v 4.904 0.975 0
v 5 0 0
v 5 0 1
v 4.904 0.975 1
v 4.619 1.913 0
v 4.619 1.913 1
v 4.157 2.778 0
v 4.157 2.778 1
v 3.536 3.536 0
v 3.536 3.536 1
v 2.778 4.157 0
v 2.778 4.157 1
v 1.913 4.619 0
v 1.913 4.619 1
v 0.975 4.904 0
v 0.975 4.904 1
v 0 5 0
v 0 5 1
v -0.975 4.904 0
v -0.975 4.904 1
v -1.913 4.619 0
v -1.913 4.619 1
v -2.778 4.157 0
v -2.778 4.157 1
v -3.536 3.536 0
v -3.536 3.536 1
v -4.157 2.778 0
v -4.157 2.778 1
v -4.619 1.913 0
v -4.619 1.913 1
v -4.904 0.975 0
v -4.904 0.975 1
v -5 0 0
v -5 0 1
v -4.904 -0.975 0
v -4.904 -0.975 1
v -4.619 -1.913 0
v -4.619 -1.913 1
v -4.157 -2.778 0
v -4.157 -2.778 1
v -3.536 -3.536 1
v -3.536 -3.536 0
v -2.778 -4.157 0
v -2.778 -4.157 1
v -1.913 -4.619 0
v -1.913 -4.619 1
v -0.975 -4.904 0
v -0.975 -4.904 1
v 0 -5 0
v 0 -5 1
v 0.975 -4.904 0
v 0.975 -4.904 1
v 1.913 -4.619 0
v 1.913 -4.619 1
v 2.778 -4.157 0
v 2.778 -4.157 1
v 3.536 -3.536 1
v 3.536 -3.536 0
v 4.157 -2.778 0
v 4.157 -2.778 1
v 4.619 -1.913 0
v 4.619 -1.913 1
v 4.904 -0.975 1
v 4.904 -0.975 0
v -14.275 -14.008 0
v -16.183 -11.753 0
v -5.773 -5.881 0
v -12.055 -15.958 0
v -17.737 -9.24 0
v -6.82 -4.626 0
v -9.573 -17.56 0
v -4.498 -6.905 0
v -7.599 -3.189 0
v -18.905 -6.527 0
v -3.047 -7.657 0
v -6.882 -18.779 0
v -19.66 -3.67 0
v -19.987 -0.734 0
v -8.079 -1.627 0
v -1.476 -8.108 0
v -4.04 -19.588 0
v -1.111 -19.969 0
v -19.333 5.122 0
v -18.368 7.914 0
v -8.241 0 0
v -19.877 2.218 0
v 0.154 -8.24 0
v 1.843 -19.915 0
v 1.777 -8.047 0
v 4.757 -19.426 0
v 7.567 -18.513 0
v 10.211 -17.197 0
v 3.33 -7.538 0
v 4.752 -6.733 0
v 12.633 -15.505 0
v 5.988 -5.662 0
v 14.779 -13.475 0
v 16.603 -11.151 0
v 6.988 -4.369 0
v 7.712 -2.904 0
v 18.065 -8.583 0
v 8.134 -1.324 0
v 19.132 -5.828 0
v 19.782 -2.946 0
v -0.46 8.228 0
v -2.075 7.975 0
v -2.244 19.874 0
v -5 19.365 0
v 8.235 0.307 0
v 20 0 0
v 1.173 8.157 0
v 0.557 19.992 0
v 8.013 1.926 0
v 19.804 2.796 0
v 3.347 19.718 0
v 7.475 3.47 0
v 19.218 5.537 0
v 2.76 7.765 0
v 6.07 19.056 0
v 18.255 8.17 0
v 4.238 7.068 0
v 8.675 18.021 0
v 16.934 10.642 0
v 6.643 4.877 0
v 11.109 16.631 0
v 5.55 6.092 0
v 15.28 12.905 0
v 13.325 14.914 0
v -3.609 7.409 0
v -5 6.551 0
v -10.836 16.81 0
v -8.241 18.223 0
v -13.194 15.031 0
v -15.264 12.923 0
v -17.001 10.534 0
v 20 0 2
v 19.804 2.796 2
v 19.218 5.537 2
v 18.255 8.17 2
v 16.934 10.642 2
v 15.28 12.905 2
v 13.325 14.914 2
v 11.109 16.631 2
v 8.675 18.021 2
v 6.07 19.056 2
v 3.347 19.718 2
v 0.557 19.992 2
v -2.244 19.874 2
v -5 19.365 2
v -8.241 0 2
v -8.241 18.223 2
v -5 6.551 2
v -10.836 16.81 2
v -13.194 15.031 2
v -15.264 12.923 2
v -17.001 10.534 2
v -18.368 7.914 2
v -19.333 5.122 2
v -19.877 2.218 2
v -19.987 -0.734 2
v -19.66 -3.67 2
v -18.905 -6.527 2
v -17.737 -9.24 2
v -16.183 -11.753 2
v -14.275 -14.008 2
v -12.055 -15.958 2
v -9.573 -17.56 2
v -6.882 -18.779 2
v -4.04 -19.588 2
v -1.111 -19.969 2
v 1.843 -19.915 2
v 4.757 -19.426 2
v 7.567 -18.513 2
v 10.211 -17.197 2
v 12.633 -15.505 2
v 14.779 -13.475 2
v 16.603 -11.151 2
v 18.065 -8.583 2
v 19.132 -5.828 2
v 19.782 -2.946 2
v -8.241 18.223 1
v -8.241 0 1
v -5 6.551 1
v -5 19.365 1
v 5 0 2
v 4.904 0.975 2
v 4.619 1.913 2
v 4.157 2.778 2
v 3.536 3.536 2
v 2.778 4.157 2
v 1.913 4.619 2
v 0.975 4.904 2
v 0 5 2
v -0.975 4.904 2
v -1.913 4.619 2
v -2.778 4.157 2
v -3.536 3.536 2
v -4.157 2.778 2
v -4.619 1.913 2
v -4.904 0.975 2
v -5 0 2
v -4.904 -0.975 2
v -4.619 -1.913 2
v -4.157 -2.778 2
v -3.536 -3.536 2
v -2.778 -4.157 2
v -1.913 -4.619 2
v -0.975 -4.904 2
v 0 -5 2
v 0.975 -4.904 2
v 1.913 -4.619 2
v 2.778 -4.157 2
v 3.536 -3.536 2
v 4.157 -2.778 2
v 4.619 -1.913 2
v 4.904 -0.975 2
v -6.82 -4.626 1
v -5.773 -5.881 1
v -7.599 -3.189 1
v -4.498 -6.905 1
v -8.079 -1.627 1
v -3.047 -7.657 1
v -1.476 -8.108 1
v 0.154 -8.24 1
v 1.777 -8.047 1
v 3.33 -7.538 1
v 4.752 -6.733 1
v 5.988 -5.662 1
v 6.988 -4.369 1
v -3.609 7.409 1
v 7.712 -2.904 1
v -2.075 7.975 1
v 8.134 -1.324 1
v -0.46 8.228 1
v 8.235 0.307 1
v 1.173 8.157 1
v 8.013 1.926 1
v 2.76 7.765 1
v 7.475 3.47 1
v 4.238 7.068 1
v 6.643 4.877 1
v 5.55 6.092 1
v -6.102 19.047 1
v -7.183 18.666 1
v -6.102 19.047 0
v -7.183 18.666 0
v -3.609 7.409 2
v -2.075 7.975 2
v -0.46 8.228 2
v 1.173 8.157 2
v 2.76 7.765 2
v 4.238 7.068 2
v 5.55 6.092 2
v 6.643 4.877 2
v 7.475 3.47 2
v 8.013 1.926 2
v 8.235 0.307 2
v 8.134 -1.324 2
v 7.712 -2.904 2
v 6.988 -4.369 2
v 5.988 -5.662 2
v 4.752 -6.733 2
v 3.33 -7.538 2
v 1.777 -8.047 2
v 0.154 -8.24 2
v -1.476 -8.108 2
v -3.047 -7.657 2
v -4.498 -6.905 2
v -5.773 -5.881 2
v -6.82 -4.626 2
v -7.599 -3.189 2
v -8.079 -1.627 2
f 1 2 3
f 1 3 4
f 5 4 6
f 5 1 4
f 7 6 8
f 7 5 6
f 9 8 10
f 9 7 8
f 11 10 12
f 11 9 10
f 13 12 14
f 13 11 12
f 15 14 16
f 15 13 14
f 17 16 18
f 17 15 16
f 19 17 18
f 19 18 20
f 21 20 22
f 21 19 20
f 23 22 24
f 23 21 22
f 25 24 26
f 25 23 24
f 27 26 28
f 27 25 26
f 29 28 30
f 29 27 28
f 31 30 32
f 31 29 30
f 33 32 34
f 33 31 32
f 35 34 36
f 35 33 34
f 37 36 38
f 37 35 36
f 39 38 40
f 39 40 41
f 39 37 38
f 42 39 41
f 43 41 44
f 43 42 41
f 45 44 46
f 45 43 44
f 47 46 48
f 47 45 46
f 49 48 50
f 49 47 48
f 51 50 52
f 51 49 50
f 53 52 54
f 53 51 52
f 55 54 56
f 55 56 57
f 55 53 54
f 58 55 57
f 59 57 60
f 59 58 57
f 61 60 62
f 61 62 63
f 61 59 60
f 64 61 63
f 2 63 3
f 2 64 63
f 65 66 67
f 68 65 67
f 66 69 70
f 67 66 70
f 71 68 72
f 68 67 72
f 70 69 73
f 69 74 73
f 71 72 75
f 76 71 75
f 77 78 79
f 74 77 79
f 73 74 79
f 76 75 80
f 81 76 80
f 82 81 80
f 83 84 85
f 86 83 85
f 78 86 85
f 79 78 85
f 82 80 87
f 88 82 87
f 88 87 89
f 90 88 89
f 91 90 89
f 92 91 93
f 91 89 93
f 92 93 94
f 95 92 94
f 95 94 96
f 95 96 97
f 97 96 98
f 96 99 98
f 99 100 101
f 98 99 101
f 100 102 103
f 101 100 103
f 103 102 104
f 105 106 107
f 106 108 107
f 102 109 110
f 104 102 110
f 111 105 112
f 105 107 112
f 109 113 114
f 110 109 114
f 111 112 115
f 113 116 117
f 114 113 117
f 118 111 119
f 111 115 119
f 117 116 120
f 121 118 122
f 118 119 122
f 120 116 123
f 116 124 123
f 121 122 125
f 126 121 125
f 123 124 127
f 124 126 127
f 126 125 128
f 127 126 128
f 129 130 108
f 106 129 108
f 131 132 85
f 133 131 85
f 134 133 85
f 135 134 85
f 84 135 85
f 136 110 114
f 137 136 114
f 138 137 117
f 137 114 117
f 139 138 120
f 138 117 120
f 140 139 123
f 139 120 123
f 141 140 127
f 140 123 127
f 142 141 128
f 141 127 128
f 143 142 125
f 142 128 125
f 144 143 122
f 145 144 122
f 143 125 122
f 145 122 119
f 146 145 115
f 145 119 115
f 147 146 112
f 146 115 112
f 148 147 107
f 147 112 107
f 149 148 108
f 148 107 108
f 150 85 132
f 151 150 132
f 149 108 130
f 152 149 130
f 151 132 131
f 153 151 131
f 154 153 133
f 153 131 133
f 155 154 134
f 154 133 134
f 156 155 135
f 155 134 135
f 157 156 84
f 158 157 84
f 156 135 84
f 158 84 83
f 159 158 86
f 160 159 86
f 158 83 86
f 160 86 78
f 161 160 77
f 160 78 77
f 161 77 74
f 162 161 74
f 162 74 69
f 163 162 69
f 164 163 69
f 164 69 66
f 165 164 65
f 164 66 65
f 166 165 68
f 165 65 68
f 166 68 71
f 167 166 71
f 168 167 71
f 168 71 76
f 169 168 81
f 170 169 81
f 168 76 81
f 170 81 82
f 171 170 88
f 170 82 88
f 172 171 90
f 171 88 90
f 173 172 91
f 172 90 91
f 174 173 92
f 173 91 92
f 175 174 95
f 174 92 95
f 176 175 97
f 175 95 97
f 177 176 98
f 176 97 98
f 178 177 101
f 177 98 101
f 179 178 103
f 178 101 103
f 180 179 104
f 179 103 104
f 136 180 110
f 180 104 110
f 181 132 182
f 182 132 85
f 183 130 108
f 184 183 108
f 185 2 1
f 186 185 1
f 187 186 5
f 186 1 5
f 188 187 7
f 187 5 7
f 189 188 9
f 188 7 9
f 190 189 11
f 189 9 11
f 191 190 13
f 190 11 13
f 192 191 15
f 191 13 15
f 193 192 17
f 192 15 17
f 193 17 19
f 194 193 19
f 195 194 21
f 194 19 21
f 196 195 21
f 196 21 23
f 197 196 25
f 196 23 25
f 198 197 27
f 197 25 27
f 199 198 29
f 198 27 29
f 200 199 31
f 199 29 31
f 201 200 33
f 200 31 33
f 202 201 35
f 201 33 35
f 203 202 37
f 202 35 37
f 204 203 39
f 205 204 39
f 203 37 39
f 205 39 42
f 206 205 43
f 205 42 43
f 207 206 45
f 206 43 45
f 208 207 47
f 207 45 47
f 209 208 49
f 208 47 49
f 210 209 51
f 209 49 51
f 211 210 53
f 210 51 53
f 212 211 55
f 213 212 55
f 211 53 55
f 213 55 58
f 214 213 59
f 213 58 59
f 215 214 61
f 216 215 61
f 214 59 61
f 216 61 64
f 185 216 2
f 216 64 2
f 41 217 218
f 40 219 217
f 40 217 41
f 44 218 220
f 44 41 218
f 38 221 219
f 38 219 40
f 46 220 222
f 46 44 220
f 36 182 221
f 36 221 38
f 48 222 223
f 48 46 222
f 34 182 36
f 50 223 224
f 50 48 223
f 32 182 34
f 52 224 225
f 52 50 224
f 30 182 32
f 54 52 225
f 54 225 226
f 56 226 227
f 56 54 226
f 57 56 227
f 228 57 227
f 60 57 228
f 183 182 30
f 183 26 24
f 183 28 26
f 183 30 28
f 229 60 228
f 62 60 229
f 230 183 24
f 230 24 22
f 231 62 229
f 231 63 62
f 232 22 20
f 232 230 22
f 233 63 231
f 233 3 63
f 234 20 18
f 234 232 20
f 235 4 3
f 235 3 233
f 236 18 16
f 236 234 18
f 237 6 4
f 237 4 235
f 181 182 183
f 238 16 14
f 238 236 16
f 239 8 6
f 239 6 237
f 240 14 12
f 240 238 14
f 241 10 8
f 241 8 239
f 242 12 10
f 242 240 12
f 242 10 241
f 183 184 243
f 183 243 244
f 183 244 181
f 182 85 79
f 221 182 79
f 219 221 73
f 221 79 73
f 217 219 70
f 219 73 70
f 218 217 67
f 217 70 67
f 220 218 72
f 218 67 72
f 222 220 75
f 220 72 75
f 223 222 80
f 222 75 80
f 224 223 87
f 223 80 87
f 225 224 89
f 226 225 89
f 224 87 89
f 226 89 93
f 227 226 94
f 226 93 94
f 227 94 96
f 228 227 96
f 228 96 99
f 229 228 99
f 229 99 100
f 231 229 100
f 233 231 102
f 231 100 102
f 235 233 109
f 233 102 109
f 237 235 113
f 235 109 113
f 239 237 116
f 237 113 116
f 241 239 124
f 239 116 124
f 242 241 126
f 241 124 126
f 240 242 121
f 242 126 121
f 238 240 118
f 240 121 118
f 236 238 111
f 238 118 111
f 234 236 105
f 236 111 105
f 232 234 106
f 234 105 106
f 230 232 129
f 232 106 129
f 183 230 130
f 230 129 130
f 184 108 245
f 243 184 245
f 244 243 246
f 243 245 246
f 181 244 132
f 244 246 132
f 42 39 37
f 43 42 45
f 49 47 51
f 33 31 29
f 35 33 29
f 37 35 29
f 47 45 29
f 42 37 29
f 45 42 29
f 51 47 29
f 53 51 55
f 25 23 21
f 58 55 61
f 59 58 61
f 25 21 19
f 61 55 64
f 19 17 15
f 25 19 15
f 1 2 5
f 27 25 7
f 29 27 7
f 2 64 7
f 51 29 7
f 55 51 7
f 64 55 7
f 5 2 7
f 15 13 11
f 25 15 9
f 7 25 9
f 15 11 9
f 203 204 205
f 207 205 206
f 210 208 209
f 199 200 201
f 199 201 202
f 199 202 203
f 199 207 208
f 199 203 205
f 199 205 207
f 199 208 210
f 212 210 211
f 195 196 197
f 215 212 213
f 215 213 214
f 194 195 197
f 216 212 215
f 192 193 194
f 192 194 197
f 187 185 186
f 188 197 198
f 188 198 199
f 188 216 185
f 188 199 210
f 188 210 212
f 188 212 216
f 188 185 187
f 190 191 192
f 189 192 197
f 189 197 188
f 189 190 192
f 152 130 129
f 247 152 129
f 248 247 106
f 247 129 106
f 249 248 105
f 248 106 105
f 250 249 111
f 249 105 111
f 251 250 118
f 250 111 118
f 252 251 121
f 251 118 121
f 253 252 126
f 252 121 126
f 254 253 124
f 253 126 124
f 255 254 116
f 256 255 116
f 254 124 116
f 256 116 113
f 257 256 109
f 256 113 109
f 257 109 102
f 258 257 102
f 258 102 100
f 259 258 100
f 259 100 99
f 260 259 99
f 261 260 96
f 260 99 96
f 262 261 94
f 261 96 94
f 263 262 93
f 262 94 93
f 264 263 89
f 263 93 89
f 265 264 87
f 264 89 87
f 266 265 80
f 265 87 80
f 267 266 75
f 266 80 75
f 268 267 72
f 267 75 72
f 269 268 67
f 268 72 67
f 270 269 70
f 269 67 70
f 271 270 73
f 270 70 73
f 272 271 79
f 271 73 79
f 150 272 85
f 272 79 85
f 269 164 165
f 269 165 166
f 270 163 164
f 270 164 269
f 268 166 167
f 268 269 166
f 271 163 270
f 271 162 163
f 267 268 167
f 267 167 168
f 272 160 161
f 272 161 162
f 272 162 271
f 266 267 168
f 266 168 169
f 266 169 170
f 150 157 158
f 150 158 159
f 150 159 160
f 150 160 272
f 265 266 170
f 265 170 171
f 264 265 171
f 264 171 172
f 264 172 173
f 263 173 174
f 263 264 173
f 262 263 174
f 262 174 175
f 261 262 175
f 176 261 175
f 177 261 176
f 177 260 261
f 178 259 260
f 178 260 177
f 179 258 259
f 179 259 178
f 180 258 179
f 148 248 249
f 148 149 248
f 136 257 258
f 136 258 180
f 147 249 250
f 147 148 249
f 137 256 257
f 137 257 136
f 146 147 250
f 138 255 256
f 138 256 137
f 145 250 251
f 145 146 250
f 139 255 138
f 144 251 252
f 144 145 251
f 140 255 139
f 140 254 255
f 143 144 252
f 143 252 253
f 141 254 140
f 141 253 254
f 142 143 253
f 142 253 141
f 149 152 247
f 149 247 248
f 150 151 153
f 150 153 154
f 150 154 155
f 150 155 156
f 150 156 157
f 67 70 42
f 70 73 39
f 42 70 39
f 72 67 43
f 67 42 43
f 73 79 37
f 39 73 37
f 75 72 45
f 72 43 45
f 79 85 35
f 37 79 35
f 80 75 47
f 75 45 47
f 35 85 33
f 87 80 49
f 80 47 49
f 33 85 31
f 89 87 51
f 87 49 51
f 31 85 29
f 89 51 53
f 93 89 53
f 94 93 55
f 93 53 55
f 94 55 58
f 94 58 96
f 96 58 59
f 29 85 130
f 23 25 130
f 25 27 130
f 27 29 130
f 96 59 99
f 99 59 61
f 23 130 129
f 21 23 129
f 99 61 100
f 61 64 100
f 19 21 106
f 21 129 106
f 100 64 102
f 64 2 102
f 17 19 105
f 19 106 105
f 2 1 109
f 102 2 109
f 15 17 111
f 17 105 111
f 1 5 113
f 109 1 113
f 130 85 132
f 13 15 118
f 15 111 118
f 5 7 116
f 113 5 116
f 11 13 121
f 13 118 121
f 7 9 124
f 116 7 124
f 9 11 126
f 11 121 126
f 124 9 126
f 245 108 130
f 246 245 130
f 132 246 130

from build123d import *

# Parameters (mm, degrees)
F0_R     = 5
F1_DEPTH = 2
F2_DEPTH = 1


with BuildPart() as f1:
    # F0 (on Top) → F1 (new body)
    with BuildSketch(Plane.XY):
        with BuildLine():
            ThreePointArc((-8.240985, 18.223231), (-10.843899, -16.805054), (20, 0))
            ThreePointArc((20, 0), (12.247449, 15.811388), (-5, 19.364917))
            Line((-5, 19.364917), (-5, 6.550865))
            ThreePointArc((-5, 6.550865), (7.386432, -3.654375), (-8.240985, 0))
            Line((-8.240985, 0), (-8.240985, 18.223231))
        make_face()
        Circle(F0_R)
    extrude(amount=F1_DEPTH)


with BuildPart() as f2:
    # F0 (on Top) → F2 (new body)
    with BuildSketch(Plane.XY):
        with BuildLine():
            Line((-5, 6.550865), (-5, 19.364917))
            ThreePointArc((-5, 19.364917), (-6.645057, 18.863807), (-8.240985, 18.223231))
            Line((-8.240985, 18.223231), (-8.240985, 0))
            ThreePointArc((-8.240985, 0), (7.386432, -3.654375), (-5, 6.550865))
        make_face()
        Circle(F0_R, mode=Mode.SUBTRACT)
    extrude(amount=F2_DEPTH)


solid = Compound([f1.part, f2.part])
